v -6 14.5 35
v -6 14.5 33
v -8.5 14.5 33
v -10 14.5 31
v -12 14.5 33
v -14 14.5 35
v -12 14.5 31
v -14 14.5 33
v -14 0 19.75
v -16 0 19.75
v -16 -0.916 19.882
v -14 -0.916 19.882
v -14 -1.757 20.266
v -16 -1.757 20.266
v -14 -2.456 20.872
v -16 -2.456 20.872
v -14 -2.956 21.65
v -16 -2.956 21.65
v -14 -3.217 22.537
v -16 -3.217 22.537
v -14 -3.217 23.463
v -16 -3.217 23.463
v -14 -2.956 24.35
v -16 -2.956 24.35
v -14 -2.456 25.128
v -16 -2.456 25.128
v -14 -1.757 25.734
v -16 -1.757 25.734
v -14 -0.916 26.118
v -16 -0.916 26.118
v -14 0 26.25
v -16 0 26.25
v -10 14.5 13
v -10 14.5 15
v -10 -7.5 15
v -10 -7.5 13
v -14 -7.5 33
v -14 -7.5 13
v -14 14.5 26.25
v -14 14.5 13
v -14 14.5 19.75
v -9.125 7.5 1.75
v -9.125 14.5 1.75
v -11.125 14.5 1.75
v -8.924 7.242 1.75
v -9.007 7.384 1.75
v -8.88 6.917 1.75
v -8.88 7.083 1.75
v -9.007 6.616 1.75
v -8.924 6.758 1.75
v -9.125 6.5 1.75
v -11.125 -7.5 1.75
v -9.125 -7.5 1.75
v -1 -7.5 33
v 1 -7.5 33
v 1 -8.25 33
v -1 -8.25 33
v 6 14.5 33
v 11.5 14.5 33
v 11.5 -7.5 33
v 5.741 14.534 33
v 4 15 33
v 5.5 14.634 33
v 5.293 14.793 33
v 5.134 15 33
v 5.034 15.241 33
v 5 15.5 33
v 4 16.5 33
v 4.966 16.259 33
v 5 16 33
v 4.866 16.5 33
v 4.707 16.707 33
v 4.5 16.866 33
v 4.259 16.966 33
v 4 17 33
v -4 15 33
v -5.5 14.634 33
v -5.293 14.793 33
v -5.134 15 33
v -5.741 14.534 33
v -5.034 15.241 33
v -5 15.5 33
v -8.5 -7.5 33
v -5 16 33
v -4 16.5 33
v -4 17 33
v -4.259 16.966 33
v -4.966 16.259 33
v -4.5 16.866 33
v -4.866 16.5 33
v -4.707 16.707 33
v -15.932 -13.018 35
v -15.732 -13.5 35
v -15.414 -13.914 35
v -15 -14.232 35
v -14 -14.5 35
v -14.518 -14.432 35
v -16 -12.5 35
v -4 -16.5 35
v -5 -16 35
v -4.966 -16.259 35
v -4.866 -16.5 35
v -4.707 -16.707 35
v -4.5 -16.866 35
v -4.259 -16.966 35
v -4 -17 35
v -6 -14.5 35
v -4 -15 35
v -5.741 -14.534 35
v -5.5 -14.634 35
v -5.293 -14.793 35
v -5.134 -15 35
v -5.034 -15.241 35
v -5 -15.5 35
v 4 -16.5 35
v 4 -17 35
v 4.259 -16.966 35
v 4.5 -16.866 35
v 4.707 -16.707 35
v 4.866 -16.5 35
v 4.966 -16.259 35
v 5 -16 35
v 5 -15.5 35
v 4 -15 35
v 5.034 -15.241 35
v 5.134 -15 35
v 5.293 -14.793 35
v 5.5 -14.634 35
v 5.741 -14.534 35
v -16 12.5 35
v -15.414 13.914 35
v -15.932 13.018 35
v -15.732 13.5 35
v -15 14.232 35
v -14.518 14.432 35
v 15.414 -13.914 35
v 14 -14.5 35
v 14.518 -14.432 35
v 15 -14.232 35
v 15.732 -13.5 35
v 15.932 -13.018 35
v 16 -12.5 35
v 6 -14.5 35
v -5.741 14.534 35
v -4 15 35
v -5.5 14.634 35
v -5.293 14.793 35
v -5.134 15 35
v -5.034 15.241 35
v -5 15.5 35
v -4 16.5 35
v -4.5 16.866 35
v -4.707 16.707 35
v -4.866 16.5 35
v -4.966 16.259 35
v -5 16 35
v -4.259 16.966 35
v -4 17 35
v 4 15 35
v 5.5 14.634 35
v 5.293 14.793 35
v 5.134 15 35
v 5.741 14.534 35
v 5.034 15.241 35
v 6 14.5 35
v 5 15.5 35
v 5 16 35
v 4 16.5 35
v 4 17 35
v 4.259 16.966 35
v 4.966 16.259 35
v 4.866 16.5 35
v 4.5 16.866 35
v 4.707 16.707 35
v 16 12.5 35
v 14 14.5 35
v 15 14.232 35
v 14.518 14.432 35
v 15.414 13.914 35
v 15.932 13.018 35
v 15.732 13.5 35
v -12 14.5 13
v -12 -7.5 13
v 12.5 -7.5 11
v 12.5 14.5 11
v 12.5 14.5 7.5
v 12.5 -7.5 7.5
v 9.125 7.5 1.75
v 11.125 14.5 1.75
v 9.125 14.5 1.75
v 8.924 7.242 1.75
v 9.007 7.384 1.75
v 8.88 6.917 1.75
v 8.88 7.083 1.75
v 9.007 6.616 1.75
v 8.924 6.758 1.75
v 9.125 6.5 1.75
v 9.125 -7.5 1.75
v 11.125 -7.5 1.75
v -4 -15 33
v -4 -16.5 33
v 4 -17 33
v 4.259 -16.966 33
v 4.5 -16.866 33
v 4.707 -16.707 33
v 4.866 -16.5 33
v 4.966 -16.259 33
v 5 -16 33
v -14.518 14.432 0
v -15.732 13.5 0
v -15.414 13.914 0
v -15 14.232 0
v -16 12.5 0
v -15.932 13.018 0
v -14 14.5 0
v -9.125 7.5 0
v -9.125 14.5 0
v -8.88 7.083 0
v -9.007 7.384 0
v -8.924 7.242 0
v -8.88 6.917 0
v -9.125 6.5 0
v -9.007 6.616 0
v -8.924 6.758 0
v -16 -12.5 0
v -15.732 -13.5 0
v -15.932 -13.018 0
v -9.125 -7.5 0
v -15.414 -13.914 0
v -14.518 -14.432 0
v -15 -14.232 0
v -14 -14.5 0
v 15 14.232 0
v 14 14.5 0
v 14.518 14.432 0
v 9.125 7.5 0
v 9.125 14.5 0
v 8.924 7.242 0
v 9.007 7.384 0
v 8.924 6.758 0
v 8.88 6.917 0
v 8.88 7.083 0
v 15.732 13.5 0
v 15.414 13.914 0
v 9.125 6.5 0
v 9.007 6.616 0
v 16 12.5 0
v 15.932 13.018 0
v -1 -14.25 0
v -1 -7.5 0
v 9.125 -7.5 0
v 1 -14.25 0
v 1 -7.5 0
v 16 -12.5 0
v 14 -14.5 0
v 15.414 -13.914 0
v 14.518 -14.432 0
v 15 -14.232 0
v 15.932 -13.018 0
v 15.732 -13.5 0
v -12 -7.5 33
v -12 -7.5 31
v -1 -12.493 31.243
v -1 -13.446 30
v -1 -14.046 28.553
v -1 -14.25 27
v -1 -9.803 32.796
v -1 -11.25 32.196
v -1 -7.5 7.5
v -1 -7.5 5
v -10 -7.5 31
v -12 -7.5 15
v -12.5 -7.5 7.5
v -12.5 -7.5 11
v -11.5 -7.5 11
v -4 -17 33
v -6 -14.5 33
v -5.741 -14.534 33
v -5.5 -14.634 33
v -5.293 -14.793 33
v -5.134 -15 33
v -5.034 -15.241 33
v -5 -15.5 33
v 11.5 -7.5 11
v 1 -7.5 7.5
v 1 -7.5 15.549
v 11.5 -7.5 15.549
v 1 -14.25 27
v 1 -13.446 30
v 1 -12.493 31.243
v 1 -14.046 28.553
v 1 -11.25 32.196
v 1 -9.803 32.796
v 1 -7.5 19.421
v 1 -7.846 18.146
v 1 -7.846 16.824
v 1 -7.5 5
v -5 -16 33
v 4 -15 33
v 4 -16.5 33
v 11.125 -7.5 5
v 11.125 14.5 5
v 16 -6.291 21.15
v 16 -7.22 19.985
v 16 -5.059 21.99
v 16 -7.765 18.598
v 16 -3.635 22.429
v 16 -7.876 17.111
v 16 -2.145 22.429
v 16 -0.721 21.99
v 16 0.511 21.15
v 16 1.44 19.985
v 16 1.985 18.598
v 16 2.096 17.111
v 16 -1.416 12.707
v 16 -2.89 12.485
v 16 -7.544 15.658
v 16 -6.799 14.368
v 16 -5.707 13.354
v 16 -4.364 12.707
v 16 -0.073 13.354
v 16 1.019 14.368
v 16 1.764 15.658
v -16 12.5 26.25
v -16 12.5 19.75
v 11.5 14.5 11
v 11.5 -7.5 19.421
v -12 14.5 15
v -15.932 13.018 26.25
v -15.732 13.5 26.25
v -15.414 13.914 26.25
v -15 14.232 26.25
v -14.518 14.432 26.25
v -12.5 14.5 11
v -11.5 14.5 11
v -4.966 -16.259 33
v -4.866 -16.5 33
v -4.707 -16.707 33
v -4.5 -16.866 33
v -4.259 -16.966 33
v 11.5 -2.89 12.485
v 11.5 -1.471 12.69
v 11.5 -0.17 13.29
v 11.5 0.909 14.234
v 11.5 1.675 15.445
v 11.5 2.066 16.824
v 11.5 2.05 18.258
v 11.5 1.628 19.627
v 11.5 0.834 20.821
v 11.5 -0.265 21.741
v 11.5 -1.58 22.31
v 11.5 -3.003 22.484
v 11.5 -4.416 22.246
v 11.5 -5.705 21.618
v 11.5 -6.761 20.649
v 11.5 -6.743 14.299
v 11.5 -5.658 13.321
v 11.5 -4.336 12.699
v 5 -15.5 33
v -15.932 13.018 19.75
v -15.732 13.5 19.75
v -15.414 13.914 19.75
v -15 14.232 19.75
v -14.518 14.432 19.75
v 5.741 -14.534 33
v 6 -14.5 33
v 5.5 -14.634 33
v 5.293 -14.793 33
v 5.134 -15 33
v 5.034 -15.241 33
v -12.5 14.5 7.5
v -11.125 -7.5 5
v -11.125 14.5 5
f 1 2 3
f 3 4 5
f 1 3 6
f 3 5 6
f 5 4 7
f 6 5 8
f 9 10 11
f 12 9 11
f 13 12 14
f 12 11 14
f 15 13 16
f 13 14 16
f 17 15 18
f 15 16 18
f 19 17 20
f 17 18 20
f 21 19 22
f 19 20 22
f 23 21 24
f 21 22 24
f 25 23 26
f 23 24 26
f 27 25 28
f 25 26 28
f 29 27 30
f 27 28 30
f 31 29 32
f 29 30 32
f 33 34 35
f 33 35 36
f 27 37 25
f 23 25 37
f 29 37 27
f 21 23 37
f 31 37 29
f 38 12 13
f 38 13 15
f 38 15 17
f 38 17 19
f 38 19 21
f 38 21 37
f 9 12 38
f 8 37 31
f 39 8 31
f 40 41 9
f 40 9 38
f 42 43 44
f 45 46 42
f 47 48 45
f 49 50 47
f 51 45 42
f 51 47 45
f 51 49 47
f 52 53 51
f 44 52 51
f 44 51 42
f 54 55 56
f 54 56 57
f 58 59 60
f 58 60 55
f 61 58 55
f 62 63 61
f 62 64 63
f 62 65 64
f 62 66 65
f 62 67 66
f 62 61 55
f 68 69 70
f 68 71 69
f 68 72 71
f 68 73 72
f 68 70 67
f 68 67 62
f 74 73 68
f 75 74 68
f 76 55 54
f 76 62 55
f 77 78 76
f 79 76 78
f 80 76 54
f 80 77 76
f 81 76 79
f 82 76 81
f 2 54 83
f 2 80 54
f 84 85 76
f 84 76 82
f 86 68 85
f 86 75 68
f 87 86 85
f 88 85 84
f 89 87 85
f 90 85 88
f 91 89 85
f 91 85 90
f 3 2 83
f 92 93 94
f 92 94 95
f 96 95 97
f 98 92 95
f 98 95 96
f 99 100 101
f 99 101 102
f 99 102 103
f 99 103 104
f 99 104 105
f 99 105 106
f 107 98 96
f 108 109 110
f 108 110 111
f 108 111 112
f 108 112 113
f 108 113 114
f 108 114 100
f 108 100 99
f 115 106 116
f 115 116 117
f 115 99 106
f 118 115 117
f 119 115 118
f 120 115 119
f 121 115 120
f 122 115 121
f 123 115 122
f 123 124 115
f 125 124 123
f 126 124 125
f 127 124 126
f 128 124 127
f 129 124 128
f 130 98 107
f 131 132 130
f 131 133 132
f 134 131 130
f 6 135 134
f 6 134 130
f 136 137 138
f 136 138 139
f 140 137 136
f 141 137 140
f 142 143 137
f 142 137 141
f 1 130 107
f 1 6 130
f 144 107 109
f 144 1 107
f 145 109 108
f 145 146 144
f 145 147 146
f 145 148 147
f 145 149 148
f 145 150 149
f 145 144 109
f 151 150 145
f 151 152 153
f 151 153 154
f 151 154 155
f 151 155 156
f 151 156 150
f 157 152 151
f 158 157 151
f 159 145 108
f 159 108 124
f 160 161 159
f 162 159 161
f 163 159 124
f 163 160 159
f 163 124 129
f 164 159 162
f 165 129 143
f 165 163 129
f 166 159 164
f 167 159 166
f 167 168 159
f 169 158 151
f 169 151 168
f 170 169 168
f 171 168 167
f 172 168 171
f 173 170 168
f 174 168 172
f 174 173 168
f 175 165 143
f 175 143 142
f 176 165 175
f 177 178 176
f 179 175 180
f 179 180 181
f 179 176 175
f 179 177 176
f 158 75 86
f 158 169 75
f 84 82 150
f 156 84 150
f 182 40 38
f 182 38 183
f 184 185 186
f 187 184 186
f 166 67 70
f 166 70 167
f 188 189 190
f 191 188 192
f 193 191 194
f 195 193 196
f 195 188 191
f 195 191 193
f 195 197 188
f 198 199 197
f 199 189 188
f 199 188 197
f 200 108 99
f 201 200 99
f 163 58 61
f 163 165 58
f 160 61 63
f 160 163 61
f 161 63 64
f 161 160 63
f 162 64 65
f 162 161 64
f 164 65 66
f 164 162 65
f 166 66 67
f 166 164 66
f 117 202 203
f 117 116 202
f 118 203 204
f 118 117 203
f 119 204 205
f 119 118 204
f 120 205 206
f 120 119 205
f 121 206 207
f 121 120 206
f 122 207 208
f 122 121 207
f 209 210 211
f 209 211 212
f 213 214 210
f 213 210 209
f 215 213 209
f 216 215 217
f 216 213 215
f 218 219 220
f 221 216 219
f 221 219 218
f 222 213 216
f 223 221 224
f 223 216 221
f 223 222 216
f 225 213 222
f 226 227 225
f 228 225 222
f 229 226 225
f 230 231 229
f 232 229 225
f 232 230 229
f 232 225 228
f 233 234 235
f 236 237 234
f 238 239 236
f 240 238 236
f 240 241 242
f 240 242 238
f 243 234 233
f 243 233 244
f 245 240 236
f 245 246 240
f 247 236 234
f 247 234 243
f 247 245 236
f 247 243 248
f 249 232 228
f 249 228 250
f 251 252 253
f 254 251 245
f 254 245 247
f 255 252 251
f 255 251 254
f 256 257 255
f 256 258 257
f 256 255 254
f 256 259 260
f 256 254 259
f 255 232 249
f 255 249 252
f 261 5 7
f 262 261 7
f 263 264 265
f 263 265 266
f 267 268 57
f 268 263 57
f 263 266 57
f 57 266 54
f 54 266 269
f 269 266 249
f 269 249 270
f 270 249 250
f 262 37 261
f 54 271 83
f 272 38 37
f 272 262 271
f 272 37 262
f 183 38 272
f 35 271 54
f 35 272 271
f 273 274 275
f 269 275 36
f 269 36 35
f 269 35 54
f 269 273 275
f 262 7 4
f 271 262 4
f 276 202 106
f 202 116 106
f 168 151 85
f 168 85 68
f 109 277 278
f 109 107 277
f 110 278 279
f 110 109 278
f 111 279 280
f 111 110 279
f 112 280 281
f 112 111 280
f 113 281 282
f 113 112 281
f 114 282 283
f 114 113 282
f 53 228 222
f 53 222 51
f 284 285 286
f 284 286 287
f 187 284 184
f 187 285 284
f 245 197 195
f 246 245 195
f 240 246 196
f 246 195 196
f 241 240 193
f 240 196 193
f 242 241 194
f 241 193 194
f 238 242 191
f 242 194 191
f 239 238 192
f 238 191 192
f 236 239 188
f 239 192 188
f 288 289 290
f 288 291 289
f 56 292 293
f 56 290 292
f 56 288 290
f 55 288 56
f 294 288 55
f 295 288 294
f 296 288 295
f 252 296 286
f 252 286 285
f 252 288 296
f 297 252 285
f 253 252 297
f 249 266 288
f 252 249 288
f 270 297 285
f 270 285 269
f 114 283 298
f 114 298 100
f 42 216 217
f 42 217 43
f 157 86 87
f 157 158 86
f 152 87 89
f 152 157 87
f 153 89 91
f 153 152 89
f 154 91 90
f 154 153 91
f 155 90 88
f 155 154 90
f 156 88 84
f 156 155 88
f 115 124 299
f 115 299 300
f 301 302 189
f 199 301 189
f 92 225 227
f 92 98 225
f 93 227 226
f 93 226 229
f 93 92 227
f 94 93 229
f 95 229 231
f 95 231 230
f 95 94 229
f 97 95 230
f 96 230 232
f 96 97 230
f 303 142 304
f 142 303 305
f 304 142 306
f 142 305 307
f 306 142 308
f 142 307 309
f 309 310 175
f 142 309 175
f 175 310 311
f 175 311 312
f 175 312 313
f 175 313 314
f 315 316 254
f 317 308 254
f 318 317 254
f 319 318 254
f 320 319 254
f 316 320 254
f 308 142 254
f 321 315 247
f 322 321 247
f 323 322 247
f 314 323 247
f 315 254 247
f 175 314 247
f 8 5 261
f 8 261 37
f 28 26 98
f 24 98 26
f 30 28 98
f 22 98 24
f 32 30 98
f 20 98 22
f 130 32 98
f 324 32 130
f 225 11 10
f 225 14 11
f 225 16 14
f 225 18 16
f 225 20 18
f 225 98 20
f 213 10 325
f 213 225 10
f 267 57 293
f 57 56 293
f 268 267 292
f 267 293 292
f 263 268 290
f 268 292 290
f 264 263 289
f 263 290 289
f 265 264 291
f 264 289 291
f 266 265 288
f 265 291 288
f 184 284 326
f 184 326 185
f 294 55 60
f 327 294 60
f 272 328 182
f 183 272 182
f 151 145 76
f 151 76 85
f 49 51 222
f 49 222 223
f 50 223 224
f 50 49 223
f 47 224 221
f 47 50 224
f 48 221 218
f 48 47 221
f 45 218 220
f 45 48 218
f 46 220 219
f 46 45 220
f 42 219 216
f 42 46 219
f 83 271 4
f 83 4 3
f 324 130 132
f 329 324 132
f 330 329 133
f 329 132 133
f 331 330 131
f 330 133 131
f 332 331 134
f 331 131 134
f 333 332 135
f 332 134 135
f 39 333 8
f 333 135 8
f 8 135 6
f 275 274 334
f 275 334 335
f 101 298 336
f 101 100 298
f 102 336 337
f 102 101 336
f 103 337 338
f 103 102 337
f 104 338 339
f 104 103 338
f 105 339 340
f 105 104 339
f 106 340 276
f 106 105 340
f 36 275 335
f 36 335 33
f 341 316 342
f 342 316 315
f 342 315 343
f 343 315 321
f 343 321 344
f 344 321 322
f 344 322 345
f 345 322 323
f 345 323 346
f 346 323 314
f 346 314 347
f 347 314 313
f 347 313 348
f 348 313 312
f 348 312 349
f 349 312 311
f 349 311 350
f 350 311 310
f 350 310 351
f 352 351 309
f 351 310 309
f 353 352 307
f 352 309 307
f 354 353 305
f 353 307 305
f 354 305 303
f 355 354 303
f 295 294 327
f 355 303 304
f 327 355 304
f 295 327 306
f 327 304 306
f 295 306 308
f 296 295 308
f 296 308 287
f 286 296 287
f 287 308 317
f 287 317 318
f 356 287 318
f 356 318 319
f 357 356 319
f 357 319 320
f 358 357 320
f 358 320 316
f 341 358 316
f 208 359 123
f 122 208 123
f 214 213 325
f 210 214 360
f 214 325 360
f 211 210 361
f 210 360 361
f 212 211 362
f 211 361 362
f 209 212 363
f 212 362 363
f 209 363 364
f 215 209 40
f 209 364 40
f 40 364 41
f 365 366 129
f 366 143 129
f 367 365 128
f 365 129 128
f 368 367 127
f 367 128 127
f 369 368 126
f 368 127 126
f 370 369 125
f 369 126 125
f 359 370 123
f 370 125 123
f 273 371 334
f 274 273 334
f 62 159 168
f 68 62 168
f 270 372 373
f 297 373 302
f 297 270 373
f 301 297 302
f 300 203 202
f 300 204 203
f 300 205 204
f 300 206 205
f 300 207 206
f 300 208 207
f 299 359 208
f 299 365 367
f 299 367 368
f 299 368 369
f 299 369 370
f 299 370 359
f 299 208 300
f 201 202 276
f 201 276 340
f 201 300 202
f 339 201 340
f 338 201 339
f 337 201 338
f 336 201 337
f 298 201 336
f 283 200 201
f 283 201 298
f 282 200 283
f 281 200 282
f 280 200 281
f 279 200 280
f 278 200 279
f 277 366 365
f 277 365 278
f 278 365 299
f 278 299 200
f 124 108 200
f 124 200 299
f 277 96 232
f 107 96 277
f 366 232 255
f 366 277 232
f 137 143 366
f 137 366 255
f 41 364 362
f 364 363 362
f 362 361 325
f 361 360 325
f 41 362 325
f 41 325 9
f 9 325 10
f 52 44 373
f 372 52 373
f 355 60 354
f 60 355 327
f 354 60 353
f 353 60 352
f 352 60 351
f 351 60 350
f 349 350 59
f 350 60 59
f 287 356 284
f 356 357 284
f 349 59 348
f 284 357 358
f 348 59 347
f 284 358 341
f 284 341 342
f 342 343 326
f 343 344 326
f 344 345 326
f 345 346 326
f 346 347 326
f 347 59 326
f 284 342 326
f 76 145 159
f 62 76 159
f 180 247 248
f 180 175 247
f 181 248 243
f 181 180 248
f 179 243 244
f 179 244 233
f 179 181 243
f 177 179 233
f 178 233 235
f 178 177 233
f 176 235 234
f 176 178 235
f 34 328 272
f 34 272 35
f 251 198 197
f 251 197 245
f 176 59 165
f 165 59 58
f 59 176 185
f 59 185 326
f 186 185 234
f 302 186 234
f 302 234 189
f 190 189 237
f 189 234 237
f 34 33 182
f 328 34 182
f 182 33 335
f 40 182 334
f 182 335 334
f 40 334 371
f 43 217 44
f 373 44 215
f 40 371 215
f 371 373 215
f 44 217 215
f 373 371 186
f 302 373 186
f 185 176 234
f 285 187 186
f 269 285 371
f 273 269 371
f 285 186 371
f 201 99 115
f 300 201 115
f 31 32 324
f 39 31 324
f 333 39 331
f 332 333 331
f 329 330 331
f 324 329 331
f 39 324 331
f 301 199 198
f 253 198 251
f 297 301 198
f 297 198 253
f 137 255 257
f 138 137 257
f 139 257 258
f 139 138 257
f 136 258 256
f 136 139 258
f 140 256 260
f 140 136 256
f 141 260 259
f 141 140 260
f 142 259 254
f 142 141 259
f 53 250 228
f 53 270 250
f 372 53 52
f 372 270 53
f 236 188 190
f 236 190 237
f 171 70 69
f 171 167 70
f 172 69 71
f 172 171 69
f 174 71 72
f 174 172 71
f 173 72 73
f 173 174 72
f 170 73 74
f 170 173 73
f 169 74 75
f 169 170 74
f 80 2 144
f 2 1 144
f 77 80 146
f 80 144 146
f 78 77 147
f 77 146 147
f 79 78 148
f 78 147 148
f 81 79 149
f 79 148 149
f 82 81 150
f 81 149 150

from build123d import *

# Parameters (mm, degrees)
SKETCH1_W                = 32
SKETCH1_H                = 29
BOSS_EXTRUDE1_DEPTH      = 35
FILLET1_R                = 2
SLOT_FOR_COIL_DEPTH      = 1
SLOT_FOR_COIL_DEPTH_BACK = 30
BOSS_EXTRUDE2_DEPTH      = 7
BOSS_EXTRUDE3_DEPTH      = 1.75
SKETCH5_W                = 2
SKETCH5_H                = 7
CUT_EXTRUDE2_DEPTH       = 33
CUT_EXTRUDE3_DEPTH       = 22
SKETCH7_W                = 2
SKETCH7_H                = 33
BOSS_EXTRUDE4_DEPTH      = 0.25
FILLET2_R                = 6
CUT_EXTRUDE5_DEPTH       = 4.5
SKETCH14_W               = 2.5
SKETCH14_H               = 20
CUT_EXTRUDE6_DEPTH       = 22
SKETCH16_W               = 2
SKETCH16_H               = 2
BOSS_EXTRUDE5_DEPTH      = 22
BOSS_EXTRUDE6_DEPTH      = 22
SKETCH21_W               = 10
SKETCH21_H               = 2
BOSS_EXTRUDE7_DEPTH      = 2.5
SKETCH23_W               = 8
SKETCH23_H               = 1.5
CUT_EXTRUDE7_DEPTH       = 2
FILLET3_R                = 1
CUT_EXTRUDE8_REACH       = 34
SKETCH26_R               = 5


with BuildPart() as part:
    # Sketch1 → Boss-Extrude1 (new body)
    with BuildSketch(Plane.XY):
        Rectangle(SKETCH1_W, SKETCH1_H)
    extrude(amount=BOSS_EXTRUDE1_DEPTH)

    # Fillet1
    fillet1_edges = [part.edges().sort_by_distance(p)[0] for p in [
        (16, -14.5, 17.5),
        (-16, -14.5, 17.5),
        (-16, 14.5, 17.5),
        (16, 14.5, 17.5),
    ]]
    fillet(fillet1_edges, radius=FILLET1_R)

    # Sketch2 → Slot for Coil (cut, two sides)
    with BuildSketch(Plane.XZ.offset(14.5)) as slot_for_coil_sk:
        Polygon((-9.125, 0), (-9.125, 1.75), (-11.125, 1.75), (-11.125, 5), (11.125, 5), (11.125, 1.75), (9.125, 1.75), (9.125, 0), align=None)
    extrude(amount=SLOT_FOR_COIL_DEPTH, mode=Mode.SUBTRACT)
    extrude(slot_for_coil_sk.sketch, amount=-SLOT_FOR_COIL_DEPTH_BACK, mode=Mode.SUBTRACT)

    # Sketch3 → Boss-Extrude2 (add)
    with BuildSketch(Plane.XZ.offset(14.5)):
        Polygon((-9.125, 0), (-9.125, 1.75), (-11.125, 1.75), (-11.125, 5), (11.125, 5), (11.125, 1.75), (9.125, 1.75), (9.125, 0), align=None)
    extrude(amount=-BOSS_EXTRUDE2_DEPTH)

    # Sketch4 → Boss-Extrude3 (add)
    with BuildSketch(Plane(origin=(0, 0, 1.75), x_dir=(-1, 0, 0), z_dir=(0, 0, -1))):
        with BuildLine():
            Line((-9.125, 7.5), (-9.125, 6.5))
            ThreePointArc((-9.125, 6.5), (-8.875, 7), (-9.125, 7.5))
        make_face()
    boss_extrude3 = extrude(amount=BOSS_EXTRUDE3_DEPTH)

    # Mirror1: Boss-Extrude3 across plane
    add(boss_extrude3.mirror(Plane(origin=(0, 0, 0), x_dir=(0, 0, 1), z_dir=(1, 0, 0))))

    # Sketch5 → Cut-Extrude2 (cut)
    with BuildSketch(Plane(origin=(0, 0, 0), x_dir=(-1, 0, 0), z_dir=(0, 0, -1))):
        with Locations((0, -11)):
            Rectangle(SKETCH5_W, SKETCH5_H)
    extrude(amount=-CUT_EXTRUDE2_DEPTH, mode=Mode.SUBTRACT)

    # Sketch6 → Cut-Extrude3 (cut)
    with BuildSketch(Plane(origin=(0, 14.5, 0), x_dir=(1, 0, 0), z_dir=(0, 1, 0))):
        Polygon((-12.5, -7.5), (-12.5, -11), (-11.5, -11), (-11.5, -33), (11.5, -33), (11.5, -11), (12.5, -11), (12.5, -7.5), align=None)
    extrude(amount=-CUT_EXTRUDE3_DEPTH, mode=Mode.SUBTRACT)

    # Sketch7 → Boss-Extrude4 (add)
    with BuildSketch(Plane.XZ.offset(14.5)):
        with Locations((0, 16.5)):
            Rectangle(SKETCH7_W, SKETCH7_H)
    extrude(amount=-BOSS_EXTRUDE4_DEPTH)

    # Fillet2
    fillet2_edges = [part.edges().sort_by_distance(p)[0] for p in [
        (0, -14.25, 33),
    ]]
    fillet(fillet2_edges, radius=FILLET2_R)

    # Sketch11 → Cut-Extrude5 (cut)
    with BuildSketch(Plane(origin=(-16, 0, 44), x_dir=(0, 0, -1), z_dir=(1, 0, 0))):
        with BuildLine():
            Line((24.25, 25), (24.25, 0))
            ThreePointArc((24.25, 0), (21, -3.25), (17.75, 0))
            Line((17.75, 0), (17.75, 25))
            ThreePointArc((17.75, 25), (21, 28.25), (24.25, 25))
        make_face()
    extrude(amount=CUT_EXTRUDE5_DEPTH, mode=Mode.SUBTRACT)

    # Sketch14 → Cut-Extrude6 (cut)
    with BuildSketch(Plane(origin=(0, 14.5, 0), x_dir=(1, 0, 0), z_dir=(0, 1, 0))):
        with Locations((-12.75, -23)):
            Rectangle(SKETCH14_W, SKETCH14_H)
    extrude(amount=-CUT_EXTRUDE6_DEPTH, mode=Mode.SUBTRACT)

    # Sketch16 → Boss-Extrude5 (add)
    with BuildSketch(Plane(origin=(0, 14.5, 0), x_dir=(1, 0, 0), z_dir=(0, 1, 0))):
        with Locations((-11, -14)):
            Rectangle(SKETCH16_W, SKETCH16_H)
        with Locations((-11, -32)):
            Rectangle(SKETCH16_W, SKETCH16_H)
    extrude(amount=-BOSS_EXTRUDE5_DEPTH)

    # Sketch20 → Boss-Extrude6 (add)
    with BuildSketch(Plane(origin=(0, 14.5, 0), x_dir=(1, 0, 0), z_dir=(0, 1, 0))):
        Polygon((-11.5, -11), (-10, -13), (-11.5, -13), align=None)
        Polygon((-10, -31), (-8.5, -33), (-10, -33), align=None)
    extrude(amount=-BOSS_EXTRUDE6_DEPTH)

    # Sketch21 → Boss-Extrude7 (add)
    with BuildSketch(Plane(origin=(0, 14.5, 0), x_dir=(-1, 0, 0), z_dir=(0, 1, 0))):
        with Locations((0, 34)):
            Rectangle(SKETCH21_W, SKETCH21_H)
    boss_extrude7 = extrude(amount=BOSS_EXTRUDE7_DEPTH)

    # Sketch23 → Cut-Extrude7 (cut)
    with BuildSketch(Plane.XY.offset(35)):
        with Locations((0, 15.75)):
            Rectangle(SKETCH23_W, SKETCH23_H)
    cut_extrude7 = extrude(amount=-CUT_EXTRUDE7_DEPTH, mode=Mode.SUBTRACT)

    # Mirror3: Boss-Extrude7, Cut-Extrude7 across plane
    add(boss_extrude7.mirror(Plane.ZX))
    add(cut_extrude7.mirror(Plane.ZX), mode=Mode.SUBTRACT)

    # Fillet3
    fillet3_edges = [part.edges().sort_by_distance(p)[0] for p in [
        (5, 14.5, 34),
        (-5, 14.5, 34),
        (5, 17, 34),
        (-5, 17, 34),
        (5, -17, 34),
        (-5, -17, 34),
        (5, -14.5, 34),
        (-5, -14.5, 34),
    ]]
    fillet(fillet3_edges, radius=FILLET3_R)

    # Sketch26 → Cut-Extrude8 (cut, up to next)
    with BuildSketch(Plane(origin=(16, 0, 0), x_dir=(0, 0, -1), z_dir=(1, 0, 0)), mode=Mode.PRIVATE) as cut_extrude8_sk1:
        with Locations((-17.485, -2.89)):
            Circle(SKETCH26_R)
    cut_extrude8_tool1 = extrude(cut_extrude8_sk1.sketch, amount=-CUT_EXTRUDE8_REACH, mode=Mode.PRIVATE) & part.part
    add(cut_extrude8_tool1.solids().sort_by_distance((16, -2.89, 17.485))[0], mode=Mode.SUBTRACT)


solid = part.part
